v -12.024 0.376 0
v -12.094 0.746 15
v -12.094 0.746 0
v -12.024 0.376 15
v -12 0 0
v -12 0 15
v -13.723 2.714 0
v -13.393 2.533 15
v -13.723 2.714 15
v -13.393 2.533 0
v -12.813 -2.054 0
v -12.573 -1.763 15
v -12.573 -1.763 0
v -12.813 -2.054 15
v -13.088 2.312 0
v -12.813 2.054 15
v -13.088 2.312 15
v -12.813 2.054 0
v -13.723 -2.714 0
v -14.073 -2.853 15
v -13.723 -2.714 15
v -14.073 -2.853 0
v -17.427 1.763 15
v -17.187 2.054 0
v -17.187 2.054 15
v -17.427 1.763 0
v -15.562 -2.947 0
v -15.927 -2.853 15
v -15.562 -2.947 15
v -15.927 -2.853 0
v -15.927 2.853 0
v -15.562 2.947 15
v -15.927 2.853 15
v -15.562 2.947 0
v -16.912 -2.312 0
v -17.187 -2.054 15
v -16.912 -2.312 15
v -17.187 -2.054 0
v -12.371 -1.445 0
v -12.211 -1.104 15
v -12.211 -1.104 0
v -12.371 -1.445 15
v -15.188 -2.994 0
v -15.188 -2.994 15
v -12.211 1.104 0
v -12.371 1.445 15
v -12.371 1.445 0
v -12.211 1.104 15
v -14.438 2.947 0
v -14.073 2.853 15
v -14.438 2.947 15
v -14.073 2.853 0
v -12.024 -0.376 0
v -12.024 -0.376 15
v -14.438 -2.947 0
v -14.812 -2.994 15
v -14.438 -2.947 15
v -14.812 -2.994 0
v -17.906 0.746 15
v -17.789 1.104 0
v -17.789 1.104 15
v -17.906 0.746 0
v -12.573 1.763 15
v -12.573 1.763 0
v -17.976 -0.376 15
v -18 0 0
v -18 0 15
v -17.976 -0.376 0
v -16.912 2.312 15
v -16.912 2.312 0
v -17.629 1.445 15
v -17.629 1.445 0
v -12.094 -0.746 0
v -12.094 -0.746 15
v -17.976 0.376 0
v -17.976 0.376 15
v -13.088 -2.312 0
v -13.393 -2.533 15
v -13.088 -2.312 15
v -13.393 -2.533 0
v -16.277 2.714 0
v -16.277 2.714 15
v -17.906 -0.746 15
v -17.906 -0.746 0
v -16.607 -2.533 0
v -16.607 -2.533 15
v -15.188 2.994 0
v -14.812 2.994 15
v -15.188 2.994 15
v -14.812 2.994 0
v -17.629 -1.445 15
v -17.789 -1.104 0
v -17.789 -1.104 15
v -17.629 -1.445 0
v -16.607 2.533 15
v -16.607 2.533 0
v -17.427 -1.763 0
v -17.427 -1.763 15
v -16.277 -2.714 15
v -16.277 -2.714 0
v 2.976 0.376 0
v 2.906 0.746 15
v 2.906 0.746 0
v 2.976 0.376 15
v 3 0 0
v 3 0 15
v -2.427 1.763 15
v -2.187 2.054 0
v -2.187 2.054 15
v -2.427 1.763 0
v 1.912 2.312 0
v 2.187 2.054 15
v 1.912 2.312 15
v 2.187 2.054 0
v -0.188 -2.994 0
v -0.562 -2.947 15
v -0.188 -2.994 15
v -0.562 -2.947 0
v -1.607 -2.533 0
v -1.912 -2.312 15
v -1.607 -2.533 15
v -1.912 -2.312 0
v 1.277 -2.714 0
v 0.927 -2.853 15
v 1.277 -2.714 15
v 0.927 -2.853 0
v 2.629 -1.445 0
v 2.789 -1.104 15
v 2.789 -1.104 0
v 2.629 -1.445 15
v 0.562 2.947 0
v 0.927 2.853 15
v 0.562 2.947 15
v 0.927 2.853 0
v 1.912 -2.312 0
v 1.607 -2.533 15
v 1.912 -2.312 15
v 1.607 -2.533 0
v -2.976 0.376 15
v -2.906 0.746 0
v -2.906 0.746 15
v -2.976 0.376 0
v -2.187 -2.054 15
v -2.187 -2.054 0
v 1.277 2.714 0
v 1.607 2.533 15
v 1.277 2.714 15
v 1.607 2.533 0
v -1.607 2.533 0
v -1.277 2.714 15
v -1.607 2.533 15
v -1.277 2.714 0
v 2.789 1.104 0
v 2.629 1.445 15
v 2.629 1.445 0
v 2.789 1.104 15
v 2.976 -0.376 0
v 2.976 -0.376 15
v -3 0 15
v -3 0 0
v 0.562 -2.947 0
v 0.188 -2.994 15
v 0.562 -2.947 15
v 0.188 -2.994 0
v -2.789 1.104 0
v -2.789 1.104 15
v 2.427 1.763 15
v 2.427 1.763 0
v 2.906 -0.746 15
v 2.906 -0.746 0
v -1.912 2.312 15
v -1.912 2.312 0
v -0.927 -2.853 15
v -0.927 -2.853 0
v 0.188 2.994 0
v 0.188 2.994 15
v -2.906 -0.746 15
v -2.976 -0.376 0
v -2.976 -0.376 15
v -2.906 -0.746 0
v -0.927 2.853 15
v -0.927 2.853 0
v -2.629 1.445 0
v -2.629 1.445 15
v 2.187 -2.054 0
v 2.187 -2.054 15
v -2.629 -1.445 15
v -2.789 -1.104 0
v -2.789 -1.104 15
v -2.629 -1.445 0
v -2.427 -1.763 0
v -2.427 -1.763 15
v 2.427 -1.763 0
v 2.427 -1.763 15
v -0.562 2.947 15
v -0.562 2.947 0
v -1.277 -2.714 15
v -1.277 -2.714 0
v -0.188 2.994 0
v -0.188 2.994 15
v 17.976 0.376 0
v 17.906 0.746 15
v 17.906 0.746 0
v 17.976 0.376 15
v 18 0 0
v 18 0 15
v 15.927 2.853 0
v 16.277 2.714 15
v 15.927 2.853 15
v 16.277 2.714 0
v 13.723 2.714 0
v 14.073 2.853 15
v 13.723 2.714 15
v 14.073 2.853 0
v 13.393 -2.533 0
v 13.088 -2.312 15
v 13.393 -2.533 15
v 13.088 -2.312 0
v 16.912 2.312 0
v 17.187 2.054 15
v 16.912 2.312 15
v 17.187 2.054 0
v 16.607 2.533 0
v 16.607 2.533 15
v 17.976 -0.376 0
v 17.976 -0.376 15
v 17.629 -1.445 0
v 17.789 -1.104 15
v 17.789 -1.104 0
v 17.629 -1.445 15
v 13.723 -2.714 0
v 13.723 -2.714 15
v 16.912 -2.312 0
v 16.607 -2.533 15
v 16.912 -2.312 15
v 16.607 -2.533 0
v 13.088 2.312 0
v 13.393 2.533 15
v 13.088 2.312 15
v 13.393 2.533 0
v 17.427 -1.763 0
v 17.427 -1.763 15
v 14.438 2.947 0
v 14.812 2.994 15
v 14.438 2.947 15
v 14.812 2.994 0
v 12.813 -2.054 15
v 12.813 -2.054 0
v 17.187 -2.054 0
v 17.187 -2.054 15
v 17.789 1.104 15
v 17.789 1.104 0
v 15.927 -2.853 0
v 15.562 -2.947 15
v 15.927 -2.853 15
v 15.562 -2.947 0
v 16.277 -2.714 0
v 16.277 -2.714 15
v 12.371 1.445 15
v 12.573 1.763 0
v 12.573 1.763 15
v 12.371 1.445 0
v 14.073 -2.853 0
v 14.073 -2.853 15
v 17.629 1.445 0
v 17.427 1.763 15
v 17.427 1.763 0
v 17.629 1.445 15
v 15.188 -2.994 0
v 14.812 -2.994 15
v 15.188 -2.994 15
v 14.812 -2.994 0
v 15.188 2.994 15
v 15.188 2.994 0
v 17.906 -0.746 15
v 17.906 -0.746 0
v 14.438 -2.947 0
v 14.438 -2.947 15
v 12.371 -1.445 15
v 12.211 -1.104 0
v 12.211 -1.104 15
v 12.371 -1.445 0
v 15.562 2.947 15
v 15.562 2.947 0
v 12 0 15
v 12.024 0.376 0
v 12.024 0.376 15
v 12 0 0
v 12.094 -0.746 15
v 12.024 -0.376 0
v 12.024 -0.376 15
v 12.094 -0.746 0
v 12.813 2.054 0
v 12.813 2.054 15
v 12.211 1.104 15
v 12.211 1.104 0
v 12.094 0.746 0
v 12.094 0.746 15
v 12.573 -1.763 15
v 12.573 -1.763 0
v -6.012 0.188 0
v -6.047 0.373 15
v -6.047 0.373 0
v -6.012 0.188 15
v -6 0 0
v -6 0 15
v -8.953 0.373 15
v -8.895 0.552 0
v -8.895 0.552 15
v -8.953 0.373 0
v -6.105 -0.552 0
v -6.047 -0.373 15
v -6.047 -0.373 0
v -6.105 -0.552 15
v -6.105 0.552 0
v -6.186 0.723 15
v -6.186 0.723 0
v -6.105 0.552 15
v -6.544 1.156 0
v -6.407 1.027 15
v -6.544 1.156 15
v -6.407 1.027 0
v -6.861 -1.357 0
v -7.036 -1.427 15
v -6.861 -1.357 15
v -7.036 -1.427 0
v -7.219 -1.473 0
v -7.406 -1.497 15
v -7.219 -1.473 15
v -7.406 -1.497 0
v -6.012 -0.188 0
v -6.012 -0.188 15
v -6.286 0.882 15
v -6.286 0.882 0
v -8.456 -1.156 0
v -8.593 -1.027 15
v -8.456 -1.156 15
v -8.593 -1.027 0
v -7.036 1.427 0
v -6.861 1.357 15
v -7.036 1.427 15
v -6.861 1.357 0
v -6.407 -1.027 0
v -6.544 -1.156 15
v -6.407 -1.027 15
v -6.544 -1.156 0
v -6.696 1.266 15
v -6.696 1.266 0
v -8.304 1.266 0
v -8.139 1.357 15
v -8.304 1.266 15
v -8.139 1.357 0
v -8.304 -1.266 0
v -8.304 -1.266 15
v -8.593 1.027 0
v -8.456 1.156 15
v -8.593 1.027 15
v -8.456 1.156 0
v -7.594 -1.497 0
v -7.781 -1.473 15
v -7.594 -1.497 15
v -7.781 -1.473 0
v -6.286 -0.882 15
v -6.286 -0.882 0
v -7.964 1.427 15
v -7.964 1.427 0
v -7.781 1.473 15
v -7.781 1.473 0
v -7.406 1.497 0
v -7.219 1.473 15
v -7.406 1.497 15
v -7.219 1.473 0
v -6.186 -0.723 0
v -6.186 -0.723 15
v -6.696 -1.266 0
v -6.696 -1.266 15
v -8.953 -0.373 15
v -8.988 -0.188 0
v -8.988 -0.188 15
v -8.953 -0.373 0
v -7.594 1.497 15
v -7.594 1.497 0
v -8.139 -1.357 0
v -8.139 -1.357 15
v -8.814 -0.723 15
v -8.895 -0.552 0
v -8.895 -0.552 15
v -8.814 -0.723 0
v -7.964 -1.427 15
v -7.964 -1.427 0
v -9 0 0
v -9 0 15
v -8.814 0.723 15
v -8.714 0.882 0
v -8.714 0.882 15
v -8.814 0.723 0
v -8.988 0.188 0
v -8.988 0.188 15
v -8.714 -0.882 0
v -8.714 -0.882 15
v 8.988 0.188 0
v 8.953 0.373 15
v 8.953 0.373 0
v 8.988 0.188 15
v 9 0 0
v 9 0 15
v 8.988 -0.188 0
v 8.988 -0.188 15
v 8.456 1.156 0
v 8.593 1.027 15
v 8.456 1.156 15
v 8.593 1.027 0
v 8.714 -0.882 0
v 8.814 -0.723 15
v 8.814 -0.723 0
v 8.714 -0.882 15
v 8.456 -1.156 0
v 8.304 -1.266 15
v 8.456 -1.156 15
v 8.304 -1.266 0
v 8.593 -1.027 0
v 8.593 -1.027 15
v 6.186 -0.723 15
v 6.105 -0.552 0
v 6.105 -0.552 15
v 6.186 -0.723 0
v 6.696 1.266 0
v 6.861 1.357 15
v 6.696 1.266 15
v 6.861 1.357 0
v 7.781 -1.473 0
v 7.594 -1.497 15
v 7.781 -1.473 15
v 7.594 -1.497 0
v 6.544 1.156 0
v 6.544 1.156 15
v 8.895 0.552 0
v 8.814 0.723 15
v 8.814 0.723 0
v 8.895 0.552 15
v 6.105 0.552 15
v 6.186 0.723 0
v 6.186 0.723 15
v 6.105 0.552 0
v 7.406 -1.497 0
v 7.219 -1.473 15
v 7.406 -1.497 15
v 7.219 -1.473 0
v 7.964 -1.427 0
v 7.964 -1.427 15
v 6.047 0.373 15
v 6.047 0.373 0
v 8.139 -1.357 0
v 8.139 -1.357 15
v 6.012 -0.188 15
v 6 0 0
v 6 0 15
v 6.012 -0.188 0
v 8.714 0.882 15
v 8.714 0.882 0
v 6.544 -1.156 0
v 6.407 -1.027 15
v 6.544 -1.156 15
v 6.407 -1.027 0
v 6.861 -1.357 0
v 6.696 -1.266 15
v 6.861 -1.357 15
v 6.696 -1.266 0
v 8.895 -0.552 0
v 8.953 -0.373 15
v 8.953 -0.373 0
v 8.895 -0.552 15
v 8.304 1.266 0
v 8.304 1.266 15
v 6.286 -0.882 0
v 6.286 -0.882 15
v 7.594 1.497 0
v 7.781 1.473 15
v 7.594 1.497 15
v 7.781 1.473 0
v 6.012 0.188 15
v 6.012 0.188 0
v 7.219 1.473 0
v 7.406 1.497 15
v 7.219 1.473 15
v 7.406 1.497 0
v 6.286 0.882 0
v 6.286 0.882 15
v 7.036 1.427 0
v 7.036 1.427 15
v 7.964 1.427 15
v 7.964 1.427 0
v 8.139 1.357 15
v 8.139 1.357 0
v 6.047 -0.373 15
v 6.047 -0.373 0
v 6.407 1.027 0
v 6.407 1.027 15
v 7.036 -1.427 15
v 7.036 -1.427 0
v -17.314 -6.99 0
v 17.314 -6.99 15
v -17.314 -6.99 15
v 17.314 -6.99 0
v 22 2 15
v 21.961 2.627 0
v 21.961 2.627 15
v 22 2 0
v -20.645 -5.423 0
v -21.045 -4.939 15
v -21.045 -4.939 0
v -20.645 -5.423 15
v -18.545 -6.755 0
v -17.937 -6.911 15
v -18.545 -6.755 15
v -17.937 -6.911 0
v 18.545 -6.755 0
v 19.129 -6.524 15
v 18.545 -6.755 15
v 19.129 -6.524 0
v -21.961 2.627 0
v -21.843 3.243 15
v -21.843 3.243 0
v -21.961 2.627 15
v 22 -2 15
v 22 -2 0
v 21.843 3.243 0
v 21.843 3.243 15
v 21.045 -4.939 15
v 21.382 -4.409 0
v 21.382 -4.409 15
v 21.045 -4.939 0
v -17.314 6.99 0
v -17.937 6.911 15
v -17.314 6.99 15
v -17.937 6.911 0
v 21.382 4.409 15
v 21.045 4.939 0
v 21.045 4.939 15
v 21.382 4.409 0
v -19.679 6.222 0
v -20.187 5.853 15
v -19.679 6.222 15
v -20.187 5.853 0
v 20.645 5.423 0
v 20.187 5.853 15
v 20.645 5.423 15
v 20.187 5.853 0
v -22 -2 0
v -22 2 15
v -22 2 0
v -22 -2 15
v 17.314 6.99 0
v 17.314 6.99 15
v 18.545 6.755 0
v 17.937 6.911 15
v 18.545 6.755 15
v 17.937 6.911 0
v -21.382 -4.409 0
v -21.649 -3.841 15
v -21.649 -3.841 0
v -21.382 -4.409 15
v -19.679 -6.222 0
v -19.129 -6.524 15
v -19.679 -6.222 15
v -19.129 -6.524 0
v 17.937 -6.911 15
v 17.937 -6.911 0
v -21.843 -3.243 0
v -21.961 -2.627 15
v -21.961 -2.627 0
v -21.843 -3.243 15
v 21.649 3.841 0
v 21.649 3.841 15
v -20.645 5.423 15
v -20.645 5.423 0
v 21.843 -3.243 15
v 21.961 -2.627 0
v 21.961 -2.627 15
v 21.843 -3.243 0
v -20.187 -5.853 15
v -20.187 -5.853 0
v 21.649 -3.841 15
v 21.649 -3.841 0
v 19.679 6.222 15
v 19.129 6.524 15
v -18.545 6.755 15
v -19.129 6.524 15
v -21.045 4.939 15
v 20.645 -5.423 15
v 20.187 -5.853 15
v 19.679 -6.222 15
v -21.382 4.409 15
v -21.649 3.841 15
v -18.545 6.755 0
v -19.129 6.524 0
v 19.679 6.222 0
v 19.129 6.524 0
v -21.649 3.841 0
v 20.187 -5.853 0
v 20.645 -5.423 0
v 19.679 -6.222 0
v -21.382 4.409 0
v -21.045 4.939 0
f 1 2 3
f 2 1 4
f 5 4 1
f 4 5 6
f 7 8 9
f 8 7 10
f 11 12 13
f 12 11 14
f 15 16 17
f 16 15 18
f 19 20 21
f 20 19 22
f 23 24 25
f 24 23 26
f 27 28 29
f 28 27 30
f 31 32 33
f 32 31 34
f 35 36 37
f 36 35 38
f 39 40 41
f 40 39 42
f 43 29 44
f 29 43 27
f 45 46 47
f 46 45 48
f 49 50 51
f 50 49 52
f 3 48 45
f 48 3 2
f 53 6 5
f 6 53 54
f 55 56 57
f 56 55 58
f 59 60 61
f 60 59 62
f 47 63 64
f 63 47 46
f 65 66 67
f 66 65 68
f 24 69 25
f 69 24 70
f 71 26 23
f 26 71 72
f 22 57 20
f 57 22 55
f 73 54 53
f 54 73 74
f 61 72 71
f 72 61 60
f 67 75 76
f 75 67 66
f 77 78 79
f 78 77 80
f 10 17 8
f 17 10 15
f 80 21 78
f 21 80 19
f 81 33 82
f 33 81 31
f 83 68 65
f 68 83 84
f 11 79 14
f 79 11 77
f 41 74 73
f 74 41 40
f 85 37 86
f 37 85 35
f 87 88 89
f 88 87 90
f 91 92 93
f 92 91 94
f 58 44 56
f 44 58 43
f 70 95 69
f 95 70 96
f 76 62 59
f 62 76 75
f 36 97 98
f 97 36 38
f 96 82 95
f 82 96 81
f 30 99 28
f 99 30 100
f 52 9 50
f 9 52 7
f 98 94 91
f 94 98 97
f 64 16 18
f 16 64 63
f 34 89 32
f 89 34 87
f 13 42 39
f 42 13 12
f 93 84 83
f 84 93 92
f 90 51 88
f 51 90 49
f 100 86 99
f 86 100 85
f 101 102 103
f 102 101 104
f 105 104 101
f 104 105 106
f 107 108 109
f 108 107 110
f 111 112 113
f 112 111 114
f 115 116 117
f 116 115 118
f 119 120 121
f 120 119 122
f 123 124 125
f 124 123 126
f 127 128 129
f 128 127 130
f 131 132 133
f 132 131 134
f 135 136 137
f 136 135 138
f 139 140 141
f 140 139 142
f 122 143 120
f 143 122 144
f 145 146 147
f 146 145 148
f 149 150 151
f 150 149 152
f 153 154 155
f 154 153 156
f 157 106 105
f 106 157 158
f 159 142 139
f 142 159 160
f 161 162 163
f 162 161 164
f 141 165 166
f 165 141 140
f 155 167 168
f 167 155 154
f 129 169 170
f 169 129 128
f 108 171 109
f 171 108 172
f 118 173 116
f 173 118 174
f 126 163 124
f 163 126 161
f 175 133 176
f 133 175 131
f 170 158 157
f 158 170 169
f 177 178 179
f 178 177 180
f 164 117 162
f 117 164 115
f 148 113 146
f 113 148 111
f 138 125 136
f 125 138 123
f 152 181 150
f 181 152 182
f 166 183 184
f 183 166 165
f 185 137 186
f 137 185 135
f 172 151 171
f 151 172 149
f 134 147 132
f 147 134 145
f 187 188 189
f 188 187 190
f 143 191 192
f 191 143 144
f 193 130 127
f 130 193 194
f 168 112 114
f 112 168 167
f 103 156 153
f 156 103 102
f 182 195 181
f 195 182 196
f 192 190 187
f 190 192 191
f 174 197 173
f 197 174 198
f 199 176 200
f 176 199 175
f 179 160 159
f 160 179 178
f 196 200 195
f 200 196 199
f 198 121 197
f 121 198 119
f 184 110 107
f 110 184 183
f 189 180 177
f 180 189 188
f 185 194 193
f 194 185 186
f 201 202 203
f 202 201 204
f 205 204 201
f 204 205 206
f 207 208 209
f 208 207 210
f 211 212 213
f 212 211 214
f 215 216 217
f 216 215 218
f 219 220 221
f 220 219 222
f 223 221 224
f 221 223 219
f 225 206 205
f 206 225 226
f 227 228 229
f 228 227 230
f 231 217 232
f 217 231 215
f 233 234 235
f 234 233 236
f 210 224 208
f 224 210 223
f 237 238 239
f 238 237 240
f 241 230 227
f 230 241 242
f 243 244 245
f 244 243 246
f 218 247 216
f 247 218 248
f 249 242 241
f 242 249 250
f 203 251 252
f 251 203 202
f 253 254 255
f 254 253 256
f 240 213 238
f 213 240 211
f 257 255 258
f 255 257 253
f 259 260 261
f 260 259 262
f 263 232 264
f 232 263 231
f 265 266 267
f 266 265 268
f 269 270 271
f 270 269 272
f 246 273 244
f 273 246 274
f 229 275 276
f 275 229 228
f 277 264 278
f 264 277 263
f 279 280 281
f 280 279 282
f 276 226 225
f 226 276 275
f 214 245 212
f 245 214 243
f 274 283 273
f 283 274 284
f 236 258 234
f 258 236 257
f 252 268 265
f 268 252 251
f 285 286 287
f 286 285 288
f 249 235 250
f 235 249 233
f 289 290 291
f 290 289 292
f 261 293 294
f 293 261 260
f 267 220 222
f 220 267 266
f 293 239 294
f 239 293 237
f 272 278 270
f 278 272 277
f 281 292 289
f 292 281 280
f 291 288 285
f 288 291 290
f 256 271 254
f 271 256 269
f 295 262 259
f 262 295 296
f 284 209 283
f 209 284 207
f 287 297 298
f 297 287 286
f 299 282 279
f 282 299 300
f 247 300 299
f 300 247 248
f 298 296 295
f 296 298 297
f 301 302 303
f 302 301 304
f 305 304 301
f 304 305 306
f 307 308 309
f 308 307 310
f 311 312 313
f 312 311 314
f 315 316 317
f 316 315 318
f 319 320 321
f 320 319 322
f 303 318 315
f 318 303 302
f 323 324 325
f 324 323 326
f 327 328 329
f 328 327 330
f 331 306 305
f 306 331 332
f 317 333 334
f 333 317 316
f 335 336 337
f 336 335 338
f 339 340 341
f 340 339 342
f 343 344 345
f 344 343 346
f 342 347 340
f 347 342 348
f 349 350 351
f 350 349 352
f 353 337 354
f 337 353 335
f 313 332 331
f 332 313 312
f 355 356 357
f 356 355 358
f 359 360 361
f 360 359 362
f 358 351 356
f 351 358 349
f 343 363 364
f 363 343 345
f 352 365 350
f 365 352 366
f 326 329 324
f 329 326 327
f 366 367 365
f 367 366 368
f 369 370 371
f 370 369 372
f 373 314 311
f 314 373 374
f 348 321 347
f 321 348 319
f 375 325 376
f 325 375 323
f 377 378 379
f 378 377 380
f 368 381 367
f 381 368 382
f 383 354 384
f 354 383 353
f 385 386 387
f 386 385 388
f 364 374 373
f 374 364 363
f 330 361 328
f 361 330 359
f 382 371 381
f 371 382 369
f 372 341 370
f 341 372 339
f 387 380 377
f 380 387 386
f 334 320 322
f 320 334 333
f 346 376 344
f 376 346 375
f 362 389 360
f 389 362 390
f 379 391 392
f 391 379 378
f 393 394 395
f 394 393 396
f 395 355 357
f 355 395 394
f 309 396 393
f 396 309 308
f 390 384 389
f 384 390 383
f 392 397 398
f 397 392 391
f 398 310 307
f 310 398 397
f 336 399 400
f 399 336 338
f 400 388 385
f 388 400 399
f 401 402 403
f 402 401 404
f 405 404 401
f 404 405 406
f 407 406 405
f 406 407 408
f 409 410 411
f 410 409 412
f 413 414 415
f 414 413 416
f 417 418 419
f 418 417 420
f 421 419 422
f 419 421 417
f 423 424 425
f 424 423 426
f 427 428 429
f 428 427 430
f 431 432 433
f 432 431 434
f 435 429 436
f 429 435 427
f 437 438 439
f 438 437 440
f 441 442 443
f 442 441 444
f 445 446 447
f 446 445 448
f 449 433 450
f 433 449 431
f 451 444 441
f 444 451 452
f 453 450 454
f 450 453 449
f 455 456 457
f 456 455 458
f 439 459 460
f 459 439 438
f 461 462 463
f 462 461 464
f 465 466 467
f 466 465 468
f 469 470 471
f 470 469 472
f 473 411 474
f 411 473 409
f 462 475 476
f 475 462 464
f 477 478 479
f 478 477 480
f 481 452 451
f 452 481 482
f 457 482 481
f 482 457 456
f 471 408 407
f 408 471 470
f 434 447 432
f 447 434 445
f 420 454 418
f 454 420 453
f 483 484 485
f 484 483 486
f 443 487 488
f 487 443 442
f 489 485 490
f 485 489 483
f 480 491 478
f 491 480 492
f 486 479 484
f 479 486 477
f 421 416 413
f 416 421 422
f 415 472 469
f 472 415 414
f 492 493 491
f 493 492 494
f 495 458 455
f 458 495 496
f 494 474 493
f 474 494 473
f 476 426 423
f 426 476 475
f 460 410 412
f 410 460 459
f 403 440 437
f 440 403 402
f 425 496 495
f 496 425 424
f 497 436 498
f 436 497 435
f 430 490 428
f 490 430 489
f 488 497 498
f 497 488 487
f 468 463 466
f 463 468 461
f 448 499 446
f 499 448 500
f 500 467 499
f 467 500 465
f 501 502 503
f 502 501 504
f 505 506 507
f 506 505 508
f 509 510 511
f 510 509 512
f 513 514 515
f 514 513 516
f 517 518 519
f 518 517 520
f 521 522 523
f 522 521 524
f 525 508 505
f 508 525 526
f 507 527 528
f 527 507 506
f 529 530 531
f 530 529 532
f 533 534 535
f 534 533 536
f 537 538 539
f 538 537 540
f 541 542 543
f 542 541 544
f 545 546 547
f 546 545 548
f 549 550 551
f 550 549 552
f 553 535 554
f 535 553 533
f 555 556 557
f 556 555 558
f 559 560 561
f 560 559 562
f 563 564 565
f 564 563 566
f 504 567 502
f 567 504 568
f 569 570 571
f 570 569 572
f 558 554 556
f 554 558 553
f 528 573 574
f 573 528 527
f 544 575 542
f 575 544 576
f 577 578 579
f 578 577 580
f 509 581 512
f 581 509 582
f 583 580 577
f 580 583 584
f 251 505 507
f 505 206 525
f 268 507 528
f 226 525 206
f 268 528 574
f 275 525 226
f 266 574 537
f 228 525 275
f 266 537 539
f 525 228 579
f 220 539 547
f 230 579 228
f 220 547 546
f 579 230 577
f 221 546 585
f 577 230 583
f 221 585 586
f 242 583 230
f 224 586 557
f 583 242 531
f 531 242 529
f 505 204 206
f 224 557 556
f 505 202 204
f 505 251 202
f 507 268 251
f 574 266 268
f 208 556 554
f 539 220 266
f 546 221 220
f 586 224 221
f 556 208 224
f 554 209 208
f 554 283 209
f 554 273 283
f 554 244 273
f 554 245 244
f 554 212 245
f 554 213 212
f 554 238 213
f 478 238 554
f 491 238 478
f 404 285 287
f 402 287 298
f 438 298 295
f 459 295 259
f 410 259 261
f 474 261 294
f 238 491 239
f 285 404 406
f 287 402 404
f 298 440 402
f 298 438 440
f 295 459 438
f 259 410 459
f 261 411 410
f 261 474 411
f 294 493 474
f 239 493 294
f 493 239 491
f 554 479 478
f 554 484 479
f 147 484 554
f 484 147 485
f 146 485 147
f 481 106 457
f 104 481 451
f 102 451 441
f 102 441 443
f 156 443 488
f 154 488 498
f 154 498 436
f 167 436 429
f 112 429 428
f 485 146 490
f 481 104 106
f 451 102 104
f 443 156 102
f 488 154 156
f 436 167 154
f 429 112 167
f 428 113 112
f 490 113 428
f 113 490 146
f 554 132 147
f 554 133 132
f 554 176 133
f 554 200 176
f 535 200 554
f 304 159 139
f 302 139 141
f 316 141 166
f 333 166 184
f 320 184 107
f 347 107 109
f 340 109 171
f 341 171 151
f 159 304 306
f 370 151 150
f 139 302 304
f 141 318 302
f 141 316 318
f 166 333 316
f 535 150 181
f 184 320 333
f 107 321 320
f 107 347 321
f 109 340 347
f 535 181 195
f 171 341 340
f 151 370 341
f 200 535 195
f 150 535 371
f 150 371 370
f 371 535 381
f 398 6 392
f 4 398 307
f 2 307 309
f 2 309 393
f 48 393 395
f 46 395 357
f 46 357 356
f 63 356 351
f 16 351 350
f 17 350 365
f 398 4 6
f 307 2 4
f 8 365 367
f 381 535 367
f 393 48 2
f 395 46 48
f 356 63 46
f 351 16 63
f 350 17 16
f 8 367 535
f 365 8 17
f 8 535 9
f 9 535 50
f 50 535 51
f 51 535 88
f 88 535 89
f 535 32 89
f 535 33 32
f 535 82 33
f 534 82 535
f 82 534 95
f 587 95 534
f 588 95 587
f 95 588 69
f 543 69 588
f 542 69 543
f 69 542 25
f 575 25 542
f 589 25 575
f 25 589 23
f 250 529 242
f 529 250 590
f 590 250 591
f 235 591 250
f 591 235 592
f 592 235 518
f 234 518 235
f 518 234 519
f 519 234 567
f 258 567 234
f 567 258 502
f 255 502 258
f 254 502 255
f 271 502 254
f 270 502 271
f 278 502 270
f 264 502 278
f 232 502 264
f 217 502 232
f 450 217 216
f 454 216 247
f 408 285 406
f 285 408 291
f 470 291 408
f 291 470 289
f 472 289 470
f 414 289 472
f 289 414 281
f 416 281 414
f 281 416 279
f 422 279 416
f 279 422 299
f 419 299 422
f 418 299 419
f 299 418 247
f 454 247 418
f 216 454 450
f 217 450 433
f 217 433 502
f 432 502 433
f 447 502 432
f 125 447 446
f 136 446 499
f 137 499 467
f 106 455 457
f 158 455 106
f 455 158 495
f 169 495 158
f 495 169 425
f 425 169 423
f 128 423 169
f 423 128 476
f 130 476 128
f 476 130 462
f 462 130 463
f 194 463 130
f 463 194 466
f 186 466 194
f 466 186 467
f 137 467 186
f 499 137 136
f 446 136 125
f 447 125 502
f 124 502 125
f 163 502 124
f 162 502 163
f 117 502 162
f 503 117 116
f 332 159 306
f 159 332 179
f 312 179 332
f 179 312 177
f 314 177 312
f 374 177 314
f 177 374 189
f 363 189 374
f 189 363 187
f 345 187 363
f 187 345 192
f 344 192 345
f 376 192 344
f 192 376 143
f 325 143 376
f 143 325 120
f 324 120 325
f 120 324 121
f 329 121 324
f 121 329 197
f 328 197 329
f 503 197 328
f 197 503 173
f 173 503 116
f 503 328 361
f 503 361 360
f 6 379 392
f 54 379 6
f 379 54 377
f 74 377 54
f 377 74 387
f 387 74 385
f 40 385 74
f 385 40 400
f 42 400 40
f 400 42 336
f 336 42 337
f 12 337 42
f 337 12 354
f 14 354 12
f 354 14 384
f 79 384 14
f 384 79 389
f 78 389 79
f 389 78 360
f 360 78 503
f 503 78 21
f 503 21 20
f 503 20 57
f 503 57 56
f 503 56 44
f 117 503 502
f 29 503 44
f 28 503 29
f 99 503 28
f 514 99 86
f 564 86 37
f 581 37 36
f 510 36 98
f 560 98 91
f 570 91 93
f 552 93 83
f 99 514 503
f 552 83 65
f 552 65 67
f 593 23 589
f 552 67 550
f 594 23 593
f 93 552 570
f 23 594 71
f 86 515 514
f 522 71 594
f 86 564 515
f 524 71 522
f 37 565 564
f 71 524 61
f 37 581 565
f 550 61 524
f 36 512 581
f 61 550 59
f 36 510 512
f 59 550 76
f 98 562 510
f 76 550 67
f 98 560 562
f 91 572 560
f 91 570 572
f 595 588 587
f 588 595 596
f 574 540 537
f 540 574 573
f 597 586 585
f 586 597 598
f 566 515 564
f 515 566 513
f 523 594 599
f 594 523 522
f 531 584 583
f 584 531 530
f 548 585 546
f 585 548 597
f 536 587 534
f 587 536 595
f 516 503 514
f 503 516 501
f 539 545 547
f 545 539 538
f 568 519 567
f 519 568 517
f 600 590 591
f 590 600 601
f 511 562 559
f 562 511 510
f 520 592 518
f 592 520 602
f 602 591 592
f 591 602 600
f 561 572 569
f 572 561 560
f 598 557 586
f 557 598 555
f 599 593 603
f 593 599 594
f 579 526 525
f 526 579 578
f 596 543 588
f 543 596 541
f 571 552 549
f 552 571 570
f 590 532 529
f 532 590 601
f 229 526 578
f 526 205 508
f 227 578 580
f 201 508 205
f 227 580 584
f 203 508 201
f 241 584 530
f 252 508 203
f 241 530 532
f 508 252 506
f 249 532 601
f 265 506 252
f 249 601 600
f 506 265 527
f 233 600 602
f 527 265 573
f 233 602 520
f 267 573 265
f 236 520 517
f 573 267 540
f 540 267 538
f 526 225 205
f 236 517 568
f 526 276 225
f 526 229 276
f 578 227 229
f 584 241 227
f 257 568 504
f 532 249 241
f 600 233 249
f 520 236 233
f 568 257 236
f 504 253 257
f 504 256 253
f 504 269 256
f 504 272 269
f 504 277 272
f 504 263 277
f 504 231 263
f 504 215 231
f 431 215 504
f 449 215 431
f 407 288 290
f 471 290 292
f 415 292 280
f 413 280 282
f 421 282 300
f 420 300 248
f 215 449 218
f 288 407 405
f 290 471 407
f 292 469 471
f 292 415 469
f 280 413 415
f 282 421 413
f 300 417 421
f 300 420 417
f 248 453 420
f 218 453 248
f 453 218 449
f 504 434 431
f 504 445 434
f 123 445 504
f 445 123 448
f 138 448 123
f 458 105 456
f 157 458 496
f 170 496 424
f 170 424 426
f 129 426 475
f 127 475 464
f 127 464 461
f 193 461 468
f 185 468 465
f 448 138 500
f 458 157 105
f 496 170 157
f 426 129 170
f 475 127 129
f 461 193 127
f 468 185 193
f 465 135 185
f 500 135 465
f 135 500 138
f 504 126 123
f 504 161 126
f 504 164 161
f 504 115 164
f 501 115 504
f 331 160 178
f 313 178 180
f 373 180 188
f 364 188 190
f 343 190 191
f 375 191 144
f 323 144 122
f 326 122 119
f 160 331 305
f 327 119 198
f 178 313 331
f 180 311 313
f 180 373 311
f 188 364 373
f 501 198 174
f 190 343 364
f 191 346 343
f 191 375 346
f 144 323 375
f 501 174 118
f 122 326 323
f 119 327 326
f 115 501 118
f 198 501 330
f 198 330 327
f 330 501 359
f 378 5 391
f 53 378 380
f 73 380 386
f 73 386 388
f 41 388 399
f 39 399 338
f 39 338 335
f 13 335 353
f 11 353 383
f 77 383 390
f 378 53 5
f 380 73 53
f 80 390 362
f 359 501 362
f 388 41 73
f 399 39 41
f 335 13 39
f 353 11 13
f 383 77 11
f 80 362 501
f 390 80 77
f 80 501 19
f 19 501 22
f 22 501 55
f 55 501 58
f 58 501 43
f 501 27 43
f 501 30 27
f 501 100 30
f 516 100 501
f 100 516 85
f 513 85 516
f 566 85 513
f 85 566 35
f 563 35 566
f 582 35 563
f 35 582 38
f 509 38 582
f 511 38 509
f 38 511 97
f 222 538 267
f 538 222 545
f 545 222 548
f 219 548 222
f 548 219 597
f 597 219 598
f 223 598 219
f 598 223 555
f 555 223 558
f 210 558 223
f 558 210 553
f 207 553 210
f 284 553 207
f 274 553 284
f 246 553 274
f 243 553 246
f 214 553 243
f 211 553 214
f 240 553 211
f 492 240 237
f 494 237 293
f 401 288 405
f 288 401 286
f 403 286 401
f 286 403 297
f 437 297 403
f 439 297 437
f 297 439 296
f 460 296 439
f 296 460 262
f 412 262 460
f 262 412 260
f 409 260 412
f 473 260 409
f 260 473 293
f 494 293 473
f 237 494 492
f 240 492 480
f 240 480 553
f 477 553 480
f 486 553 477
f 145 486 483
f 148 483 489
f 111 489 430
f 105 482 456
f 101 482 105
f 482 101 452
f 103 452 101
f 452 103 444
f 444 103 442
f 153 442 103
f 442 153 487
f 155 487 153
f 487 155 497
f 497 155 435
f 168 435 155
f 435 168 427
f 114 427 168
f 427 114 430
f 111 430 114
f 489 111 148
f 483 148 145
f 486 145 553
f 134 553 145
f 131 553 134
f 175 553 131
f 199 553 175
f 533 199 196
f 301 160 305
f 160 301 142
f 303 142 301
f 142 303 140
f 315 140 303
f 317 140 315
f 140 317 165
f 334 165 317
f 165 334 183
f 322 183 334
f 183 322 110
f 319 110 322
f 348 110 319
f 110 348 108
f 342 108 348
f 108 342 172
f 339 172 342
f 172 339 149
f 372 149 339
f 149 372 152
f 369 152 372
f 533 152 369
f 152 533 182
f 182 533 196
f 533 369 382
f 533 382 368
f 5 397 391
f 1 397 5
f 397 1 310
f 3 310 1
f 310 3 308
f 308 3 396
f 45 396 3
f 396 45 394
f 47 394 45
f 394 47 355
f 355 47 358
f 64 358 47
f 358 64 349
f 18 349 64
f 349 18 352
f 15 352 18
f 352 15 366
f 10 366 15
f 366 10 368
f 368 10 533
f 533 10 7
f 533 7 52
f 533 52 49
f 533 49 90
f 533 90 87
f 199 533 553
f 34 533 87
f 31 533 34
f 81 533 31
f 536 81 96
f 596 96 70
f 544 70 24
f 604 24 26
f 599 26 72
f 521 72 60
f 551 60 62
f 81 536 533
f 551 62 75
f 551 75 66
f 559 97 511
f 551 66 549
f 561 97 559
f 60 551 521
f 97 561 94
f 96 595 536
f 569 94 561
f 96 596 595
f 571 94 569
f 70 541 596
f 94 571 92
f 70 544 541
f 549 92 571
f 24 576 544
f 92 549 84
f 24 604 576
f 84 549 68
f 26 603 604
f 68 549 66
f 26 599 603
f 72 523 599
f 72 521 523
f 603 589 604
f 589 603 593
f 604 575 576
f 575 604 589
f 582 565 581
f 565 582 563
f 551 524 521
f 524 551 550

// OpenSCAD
$fn = 50;


difference() {
	union() {
		*color(alpha = 1.0000000000, c = "gray") {
			translate(v = [0, 7, 0]) {
				linear_extrude(height = 1) {
					text(font = "Arial:style=Bold", halign = "center", size = 4.5000000000, text = "COMMENT plate main", valign = "center");
				}
			}
		}
		*color(alpha = 1.0000000000, c = "gray") {
			translate(v = [0, 14, 0]) {
				linear_extrude(height = 1) {
					text(font = "Arial:style=Bold", halign = "center", size = 4.5000000000, text = "COMMENT description oobb_plate_shape_p_type_15_depth_3_width_1_height_15_thickness_true_both_holes", valign = "center");
				}
			}
		}
		hull() {
			translate(v = [-17.0000000000, 2.0000000000, 0]) {
				cylinder(h = 15, r = 5);
			}
			translate(v = [17.0000000000, 2.0000000000, 0]) {
				cylinder(h = 15, r = 5);
			}
			translate(v = [-17.0000000000, -2.0000000000, 0]) {
				cylinder(h = 15, r = 5);
			}
			translate(v = [17.0000000000, -2.0000000000, 0]) {
				cylinder(h = 15, r = 5);
			}
		}
	}
	union() {
		*color(alpha = 1.0000000000, c = "gray") {
			translate(v = [0, 7, 0]) {
				linear_extrude(height = 1) {
					text(font = "Arial:style=Bold", halign = "center", size = 4.5000000000, text = "COMMENT holes main", valign = "center");
				}
			}
		}
		*color(alpha = 1.0000000000, c = "gray") {
			translate(v = [0, 14, 0]) {
				linear_extrude(height = 1) {
					text(font = "Arial:style=Bold", halign = "center", size = 4.5000000000, text = "COMMENT description oobb_holes_shape_n_type_3_width_1_height_15_thickness_true_both_holes", valign = "center");
				}
			}
		}
		translate(v = [-15.0000000000, 0.0000000000, 0]) {
			translate(v = [0, 0, -50]) {
				cylinder(h = 100, r = 3.0000000000);
			}
		}
		translate(v = [0, 0, -50]) {
			cylinder(h = 100, r = 3.0000000000);
		}
		translate(v = [15.0000000000, 0.0000000000, 0]) {
			translate(v = [0, 0, -50]) {
				cylinder(h = 100, r = 3.0000000000);
			}
		}
		translate(v = [-15.0000000000, 0.0000000000, 0]) {
			translate(v = [0, 0, -50]) {
				cylinder(h = 100, r = 1.5000000000);
			}
		}
		translate(v = [-7.5000000000, 0.0000000000, 0]) {
			translate(v = [0, 0, -50]) {
				cylinder(h = 100, r = 1.5000000000);
			}
		}
		translate(v = [0, 0, -50]) {
			cylinder(h = 100, r = 1.5000000000);
		}
		translate(v = [7.5000000000, 0.0000000000, 0]) {
			translate(v = [0, 0, -50]) {
				cylinder(h = 100, r = 1.5000000000);
			}
		}
		translate(v = [15.0000000000, 0.0000000000, 0]) {
			translate(v = [0, 0, -50]) {
				cylinder(h = 100, r = 1.5000000000);
			}
		}
	}
}
